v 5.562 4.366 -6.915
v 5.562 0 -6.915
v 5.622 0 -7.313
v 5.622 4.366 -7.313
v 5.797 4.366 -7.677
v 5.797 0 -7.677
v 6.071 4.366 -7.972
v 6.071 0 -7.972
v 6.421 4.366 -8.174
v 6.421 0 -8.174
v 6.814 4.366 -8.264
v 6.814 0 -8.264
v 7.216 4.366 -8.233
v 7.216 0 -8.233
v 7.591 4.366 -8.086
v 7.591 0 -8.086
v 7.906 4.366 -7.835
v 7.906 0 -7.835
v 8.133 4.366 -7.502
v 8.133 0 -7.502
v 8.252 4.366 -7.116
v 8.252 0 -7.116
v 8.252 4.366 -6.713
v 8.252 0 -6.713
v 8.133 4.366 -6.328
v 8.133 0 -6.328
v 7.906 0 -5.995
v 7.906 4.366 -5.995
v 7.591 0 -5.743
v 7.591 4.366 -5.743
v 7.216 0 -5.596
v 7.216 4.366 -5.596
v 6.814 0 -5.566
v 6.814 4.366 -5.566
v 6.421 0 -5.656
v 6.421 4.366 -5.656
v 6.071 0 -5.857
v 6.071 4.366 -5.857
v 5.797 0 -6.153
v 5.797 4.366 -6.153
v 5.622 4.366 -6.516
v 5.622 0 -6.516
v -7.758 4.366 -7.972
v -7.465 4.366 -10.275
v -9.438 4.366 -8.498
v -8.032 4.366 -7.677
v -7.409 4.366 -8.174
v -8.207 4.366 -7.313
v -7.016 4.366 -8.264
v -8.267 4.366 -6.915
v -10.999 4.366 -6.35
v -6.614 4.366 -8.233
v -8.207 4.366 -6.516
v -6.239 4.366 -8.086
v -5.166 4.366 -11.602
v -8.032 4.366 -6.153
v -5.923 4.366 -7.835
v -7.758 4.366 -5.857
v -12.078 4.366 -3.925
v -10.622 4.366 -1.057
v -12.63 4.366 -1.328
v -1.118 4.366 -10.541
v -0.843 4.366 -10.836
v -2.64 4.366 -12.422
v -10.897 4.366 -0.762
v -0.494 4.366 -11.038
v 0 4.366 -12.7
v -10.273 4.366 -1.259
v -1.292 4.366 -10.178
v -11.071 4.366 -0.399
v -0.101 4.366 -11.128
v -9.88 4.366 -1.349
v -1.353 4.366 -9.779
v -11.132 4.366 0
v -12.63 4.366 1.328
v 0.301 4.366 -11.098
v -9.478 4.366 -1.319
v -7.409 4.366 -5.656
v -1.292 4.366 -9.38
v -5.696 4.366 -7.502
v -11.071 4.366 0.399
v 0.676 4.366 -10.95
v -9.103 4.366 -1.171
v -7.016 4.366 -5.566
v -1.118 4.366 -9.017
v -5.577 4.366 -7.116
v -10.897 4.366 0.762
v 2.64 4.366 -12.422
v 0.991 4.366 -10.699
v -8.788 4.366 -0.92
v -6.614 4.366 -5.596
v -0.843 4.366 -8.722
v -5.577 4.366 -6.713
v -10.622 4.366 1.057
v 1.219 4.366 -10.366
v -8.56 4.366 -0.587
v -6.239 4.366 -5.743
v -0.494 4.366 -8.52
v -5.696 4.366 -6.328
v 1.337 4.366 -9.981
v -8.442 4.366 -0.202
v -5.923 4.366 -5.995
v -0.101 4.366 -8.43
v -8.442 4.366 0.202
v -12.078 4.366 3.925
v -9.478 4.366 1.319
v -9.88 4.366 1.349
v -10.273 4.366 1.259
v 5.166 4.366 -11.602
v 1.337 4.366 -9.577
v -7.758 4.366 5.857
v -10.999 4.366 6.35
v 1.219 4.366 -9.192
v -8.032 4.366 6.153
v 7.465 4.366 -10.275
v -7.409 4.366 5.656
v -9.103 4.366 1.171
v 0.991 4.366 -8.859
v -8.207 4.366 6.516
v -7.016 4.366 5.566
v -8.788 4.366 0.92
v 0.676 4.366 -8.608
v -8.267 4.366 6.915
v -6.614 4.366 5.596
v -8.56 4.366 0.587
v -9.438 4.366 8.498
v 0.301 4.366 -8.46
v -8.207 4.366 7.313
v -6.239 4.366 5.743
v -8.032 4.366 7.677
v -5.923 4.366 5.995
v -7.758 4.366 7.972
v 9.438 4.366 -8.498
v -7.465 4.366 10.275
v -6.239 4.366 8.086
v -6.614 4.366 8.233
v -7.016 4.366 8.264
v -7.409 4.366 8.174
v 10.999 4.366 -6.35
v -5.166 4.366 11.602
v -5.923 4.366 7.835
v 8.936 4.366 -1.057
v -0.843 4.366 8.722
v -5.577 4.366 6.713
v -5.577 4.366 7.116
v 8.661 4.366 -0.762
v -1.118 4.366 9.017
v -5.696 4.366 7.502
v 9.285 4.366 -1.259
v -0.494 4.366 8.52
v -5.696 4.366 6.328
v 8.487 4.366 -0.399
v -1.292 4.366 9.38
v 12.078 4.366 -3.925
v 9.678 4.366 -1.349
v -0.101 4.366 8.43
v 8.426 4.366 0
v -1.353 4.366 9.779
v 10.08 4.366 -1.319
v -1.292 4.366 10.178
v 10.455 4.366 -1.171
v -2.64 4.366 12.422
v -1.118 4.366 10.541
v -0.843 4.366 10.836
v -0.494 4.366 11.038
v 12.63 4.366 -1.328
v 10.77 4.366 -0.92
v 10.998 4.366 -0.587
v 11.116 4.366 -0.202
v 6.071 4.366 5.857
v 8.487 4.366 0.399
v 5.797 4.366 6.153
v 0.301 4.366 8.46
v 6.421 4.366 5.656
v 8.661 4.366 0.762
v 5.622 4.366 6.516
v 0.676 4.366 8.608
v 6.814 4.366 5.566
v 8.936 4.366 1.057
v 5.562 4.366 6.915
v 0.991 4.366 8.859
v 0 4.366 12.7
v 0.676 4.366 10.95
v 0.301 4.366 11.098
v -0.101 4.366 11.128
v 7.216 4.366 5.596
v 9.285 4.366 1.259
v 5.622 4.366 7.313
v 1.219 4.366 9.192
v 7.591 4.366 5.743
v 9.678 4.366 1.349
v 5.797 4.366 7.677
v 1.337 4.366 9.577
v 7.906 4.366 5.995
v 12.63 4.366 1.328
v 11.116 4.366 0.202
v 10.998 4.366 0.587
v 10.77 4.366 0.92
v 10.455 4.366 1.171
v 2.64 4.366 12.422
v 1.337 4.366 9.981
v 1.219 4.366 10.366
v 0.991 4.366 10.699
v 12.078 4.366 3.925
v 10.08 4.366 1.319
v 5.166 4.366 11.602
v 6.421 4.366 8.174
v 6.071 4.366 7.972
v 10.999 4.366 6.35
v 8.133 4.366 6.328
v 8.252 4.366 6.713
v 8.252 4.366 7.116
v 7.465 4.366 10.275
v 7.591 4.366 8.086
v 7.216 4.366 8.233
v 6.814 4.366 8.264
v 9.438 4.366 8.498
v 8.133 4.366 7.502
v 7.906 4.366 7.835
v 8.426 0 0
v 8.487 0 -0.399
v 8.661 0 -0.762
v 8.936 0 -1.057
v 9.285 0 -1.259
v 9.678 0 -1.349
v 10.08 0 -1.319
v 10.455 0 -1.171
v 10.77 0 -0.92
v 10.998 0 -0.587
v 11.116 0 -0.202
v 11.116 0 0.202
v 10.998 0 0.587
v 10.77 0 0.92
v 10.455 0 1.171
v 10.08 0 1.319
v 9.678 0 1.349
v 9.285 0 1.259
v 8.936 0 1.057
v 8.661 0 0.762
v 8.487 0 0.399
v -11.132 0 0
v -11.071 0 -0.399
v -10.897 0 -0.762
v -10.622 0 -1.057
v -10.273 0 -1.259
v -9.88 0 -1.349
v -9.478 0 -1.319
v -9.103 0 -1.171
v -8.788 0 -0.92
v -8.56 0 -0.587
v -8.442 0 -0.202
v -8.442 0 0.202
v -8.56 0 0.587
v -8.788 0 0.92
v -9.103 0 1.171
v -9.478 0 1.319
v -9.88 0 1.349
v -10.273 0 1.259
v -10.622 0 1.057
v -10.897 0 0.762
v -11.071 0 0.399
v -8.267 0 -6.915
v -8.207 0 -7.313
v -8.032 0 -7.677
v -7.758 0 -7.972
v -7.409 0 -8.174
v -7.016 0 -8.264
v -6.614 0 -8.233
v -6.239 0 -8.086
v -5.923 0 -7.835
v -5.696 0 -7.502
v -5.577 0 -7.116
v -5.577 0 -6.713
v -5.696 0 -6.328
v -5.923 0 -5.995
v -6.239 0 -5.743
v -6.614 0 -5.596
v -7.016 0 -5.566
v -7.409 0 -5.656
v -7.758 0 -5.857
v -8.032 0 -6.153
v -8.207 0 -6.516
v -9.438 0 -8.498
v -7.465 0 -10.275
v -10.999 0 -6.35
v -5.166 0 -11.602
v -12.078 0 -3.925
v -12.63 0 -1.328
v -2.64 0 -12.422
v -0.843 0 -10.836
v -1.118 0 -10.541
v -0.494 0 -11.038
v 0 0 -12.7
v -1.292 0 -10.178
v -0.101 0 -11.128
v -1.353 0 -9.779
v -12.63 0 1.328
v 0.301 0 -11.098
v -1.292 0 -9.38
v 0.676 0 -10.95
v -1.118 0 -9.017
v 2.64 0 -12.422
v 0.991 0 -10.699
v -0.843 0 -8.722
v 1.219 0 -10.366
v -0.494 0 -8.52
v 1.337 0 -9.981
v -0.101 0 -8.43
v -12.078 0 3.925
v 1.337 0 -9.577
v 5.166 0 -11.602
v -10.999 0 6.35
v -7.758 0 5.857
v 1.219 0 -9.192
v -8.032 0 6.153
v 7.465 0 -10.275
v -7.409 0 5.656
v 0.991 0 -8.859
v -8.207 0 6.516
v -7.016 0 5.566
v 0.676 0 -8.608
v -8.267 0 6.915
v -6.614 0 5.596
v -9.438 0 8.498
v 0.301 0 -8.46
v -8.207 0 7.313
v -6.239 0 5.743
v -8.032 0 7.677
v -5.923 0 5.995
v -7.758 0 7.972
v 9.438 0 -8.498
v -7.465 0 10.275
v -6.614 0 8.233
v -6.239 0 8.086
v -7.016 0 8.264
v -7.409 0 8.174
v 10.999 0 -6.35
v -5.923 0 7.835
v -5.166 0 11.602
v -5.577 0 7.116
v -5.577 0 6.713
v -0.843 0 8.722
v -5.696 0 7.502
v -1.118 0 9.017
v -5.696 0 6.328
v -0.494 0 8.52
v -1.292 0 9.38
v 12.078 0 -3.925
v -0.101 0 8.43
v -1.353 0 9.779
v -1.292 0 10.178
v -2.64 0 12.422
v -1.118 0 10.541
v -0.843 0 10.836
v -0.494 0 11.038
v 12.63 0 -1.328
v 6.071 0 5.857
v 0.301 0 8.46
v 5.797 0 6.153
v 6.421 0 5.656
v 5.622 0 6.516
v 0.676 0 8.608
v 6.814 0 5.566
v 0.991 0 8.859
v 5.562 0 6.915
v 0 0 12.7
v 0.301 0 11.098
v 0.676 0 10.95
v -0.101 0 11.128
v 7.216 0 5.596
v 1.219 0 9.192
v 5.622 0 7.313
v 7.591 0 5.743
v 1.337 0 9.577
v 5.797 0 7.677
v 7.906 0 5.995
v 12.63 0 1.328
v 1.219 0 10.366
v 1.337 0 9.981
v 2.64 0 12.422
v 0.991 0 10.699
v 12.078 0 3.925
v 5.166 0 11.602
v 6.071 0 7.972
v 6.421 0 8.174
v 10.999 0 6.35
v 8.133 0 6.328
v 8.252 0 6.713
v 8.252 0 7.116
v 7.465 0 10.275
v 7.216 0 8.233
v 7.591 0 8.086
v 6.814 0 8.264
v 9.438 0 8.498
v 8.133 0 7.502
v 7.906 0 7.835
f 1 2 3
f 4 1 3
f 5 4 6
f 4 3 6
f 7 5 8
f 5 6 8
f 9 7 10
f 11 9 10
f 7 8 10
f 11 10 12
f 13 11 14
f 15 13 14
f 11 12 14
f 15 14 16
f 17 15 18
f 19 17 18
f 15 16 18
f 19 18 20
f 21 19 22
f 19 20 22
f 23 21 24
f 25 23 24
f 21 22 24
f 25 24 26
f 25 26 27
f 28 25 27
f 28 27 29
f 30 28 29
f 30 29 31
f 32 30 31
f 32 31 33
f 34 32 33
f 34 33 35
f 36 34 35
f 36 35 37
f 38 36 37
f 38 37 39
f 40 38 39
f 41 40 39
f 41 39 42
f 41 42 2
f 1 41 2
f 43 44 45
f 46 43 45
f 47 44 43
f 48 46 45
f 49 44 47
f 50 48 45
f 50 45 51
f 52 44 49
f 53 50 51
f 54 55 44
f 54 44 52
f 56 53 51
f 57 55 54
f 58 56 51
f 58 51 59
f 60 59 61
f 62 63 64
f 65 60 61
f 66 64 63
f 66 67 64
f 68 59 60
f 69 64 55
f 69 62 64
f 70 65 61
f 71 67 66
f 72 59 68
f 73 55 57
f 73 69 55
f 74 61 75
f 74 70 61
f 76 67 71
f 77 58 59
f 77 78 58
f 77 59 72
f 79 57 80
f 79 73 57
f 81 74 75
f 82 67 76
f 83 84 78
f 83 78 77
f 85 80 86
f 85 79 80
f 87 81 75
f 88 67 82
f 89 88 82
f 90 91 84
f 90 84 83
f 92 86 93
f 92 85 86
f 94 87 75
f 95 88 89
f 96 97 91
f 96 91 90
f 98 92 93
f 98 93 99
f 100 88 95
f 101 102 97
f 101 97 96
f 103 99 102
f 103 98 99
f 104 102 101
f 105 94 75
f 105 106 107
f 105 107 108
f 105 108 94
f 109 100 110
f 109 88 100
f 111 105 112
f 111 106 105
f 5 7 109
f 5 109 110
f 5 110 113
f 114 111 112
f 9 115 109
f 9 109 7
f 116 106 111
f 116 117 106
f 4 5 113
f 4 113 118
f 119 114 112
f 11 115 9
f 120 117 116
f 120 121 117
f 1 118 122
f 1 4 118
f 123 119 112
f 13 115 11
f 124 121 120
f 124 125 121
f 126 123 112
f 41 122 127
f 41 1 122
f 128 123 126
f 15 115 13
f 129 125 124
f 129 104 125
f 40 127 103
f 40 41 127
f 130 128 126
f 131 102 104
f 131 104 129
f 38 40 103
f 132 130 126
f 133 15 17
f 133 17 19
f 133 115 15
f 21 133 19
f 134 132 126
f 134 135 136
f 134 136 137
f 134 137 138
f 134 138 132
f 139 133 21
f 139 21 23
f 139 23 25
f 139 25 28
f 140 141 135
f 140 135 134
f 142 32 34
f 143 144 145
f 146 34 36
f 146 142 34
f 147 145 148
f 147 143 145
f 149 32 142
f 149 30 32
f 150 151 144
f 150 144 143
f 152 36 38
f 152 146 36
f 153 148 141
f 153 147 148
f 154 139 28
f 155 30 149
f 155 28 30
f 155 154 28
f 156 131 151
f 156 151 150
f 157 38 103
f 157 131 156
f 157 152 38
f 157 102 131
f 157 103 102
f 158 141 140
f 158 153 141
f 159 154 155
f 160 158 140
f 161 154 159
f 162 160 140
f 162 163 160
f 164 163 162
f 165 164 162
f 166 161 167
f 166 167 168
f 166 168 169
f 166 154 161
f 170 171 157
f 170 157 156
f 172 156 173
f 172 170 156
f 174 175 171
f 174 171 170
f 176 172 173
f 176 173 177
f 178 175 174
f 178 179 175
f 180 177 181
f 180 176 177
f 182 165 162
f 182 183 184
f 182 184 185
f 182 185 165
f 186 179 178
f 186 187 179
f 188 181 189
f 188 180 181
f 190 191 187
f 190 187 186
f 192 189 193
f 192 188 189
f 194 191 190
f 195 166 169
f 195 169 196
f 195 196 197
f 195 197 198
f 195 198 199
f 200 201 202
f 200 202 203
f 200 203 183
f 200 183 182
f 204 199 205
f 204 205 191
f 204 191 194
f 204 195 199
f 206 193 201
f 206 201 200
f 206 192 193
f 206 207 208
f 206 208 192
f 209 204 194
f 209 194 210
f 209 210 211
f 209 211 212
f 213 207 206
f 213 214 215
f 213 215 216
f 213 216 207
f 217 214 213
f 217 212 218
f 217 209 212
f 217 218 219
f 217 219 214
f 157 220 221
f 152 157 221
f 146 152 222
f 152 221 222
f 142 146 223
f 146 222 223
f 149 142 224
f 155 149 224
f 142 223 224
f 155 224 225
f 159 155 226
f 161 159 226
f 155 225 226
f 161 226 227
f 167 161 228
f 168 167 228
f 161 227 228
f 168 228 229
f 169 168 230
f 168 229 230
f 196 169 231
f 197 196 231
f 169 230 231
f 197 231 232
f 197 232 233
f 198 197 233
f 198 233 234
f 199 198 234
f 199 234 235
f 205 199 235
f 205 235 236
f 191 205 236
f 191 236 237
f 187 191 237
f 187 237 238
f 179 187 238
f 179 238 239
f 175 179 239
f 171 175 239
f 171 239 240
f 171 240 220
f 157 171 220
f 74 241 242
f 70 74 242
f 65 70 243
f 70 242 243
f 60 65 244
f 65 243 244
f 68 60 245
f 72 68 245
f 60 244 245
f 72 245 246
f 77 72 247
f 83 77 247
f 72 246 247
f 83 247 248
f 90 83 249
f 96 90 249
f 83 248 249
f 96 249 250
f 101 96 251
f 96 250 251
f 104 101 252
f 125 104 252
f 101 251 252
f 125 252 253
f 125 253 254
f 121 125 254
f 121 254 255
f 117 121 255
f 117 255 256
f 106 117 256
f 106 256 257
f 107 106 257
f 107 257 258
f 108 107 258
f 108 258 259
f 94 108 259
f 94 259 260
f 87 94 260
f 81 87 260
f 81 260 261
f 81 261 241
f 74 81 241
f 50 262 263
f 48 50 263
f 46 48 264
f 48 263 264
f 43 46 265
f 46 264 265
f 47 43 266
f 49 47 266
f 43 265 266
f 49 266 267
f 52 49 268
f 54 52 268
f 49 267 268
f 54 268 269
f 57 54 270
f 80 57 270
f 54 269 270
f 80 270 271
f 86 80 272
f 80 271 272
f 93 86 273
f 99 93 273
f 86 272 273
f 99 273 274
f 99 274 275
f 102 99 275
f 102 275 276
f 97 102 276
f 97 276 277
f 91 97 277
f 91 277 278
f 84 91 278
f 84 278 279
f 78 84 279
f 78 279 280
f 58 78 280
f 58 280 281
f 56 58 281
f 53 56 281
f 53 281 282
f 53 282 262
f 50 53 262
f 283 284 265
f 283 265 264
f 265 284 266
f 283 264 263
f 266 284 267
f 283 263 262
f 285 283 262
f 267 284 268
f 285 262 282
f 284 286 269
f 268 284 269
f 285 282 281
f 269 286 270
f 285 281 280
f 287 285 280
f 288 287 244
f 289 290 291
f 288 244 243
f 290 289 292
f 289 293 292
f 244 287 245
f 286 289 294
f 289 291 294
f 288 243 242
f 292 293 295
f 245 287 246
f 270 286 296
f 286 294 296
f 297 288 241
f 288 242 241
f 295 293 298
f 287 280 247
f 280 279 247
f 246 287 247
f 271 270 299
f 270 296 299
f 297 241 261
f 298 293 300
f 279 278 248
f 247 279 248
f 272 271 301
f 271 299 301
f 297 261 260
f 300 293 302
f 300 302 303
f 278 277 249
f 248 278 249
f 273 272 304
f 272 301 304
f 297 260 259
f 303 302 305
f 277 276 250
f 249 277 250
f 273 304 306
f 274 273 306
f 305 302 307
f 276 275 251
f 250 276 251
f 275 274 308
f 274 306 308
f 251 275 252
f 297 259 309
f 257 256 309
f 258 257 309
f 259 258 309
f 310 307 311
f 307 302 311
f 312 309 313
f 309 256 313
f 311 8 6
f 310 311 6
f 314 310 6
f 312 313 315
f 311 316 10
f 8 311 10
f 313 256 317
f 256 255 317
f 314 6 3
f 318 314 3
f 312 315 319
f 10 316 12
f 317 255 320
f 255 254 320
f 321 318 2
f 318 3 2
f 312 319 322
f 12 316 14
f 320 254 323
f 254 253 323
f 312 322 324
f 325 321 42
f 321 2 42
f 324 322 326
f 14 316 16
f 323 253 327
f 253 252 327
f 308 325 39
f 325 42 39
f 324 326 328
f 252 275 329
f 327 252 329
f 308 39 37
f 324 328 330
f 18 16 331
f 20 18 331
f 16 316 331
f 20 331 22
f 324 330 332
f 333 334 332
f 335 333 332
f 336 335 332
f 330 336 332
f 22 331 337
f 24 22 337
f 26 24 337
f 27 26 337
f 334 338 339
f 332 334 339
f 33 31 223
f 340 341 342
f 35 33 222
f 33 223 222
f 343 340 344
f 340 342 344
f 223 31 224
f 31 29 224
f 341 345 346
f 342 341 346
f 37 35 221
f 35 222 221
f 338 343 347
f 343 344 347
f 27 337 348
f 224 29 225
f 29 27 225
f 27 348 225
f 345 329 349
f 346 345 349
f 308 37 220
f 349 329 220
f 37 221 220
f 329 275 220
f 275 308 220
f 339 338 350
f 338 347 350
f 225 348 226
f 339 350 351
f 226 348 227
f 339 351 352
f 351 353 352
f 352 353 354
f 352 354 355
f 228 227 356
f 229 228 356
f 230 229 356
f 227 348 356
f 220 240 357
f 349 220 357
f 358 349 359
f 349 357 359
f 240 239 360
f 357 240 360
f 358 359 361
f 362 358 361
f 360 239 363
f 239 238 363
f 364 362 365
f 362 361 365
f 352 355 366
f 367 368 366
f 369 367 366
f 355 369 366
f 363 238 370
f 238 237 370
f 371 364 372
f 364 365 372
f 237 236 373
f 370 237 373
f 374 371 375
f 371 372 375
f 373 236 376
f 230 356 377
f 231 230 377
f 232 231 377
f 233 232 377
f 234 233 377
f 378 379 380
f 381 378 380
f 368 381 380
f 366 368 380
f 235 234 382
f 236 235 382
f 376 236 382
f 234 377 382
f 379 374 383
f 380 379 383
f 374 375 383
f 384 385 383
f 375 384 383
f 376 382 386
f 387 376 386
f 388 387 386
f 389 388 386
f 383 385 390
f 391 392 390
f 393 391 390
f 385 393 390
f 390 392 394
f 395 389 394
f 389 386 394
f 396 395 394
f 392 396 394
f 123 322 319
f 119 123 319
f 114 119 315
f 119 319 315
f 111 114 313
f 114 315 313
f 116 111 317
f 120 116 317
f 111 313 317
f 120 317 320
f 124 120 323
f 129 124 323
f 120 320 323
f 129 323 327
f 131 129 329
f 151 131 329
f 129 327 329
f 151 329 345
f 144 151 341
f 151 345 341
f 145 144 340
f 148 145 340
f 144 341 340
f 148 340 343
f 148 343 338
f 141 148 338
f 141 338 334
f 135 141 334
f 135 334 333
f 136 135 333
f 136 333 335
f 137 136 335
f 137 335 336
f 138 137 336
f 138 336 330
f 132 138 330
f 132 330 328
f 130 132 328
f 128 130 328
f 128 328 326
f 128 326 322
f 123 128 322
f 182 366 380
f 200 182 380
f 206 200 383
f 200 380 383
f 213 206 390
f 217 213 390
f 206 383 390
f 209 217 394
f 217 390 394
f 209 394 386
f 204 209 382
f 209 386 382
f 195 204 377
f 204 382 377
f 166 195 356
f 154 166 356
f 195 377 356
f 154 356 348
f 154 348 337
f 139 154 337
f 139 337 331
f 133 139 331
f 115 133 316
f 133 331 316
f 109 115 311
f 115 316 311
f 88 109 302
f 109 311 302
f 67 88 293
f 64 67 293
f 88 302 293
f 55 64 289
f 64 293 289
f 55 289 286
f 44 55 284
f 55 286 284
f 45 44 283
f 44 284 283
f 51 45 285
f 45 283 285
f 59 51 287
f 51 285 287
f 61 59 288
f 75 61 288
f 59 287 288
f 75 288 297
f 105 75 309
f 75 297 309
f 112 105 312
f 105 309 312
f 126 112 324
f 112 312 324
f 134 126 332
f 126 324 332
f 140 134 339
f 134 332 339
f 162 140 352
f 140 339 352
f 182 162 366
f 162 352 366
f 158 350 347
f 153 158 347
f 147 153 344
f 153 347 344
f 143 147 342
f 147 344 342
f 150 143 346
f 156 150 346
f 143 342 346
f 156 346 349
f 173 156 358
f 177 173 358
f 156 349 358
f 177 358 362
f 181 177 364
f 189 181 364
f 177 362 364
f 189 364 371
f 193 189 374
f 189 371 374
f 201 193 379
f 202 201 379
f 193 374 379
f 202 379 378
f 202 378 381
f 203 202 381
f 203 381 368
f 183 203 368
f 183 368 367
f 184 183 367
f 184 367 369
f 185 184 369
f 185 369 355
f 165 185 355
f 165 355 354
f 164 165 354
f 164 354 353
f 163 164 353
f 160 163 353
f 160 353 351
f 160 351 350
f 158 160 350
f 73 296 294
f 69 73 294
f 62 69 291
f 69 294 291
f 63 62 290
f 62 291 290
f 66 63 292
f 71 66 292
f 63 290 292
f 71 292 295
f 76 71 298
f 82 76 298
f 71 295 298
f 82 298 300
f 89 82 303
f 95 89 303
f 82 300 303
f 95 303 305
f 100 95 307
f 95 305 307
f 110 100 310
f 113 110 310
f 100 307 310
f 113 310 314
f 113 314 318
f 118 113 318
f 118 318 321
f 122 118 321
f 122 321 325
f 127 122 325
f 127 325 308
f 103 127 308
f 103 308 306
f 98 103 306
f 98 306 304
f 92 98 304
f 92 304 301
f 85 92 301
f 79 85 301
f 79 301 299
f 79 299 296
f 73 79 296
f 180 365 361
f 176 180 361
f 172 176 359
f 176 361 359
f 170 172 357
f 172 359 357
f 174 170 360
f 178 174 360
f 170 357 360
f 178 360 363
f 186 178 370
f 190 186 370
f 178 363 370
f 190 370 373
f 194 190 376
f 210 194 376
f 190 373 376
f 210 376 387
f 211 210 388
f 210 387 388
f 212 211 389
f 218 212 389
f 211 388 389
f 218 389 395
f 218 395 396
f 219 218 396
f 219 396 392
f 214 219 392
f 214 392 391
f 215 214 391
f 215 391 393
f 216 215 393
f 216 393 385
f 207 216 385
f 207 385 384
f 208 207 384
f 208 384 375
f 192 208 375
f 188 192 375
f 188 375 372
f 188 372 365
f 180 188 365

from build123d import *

# Parameters (mm, degrees)
SKETCH1_R                 = 12.7
BOSS_EXTRUDE1_DEPTH       = 4.365625
F_6_32_TAPPED_HOLE1_D     = 2.7051
F_6_32_TAPPED_HOLE1_DEPTH = 23.876
F_6_32_TAPPED_HOLE1_TIP   = 0.81269403


with BuildPart() as part:
    # Sketch1 → Boss-Extrude1 (new body)
    with BuildSketch(Plane(origin=(0, 0, 0), x_dir=(1, 0, 0), z_dir=(0, 1, 0))):
        with Locations(Location((0, 0, 0), (0, 0, 270))):
            Circle(SKETCH1_R)
    extrude(amount=BOSS_EXTRUDE1_DEPTH)

    # #6-32 Tapped Hole1
    with Locations(Plane(origin=(0, 4.365625, 0), x_dir=(1, 0, 0), z_dir=(0, 1, 0))):
        with Locations((0, 9.779), (6.914797213, 6.914797213), (9.779, 0), (6.914797213, -6.914797213), (0, -9.779), (-6.914797213, -6.914797213), (-9.779, 0), (-6.914797213, 6.914797213)):
            Hole(F_6_32_TAPPED_HOLE1_D / 2, depth=F_6_32_TAPPED_HOLE1_DEPTH)
            with Locations((0, 0, -(F_6_32_TAPPED_HOLE1_DEPTH + F_6_32_TAPPED_HOLE1_TIP / 2))):  # 118° drill point
                Cone(0, F_6_32_TAPPED_HOLE1_D / 2, F_6_32_TAPPED_HOLE1_TIP, mode=Mode.SUBTRACT)


solid = part.part
